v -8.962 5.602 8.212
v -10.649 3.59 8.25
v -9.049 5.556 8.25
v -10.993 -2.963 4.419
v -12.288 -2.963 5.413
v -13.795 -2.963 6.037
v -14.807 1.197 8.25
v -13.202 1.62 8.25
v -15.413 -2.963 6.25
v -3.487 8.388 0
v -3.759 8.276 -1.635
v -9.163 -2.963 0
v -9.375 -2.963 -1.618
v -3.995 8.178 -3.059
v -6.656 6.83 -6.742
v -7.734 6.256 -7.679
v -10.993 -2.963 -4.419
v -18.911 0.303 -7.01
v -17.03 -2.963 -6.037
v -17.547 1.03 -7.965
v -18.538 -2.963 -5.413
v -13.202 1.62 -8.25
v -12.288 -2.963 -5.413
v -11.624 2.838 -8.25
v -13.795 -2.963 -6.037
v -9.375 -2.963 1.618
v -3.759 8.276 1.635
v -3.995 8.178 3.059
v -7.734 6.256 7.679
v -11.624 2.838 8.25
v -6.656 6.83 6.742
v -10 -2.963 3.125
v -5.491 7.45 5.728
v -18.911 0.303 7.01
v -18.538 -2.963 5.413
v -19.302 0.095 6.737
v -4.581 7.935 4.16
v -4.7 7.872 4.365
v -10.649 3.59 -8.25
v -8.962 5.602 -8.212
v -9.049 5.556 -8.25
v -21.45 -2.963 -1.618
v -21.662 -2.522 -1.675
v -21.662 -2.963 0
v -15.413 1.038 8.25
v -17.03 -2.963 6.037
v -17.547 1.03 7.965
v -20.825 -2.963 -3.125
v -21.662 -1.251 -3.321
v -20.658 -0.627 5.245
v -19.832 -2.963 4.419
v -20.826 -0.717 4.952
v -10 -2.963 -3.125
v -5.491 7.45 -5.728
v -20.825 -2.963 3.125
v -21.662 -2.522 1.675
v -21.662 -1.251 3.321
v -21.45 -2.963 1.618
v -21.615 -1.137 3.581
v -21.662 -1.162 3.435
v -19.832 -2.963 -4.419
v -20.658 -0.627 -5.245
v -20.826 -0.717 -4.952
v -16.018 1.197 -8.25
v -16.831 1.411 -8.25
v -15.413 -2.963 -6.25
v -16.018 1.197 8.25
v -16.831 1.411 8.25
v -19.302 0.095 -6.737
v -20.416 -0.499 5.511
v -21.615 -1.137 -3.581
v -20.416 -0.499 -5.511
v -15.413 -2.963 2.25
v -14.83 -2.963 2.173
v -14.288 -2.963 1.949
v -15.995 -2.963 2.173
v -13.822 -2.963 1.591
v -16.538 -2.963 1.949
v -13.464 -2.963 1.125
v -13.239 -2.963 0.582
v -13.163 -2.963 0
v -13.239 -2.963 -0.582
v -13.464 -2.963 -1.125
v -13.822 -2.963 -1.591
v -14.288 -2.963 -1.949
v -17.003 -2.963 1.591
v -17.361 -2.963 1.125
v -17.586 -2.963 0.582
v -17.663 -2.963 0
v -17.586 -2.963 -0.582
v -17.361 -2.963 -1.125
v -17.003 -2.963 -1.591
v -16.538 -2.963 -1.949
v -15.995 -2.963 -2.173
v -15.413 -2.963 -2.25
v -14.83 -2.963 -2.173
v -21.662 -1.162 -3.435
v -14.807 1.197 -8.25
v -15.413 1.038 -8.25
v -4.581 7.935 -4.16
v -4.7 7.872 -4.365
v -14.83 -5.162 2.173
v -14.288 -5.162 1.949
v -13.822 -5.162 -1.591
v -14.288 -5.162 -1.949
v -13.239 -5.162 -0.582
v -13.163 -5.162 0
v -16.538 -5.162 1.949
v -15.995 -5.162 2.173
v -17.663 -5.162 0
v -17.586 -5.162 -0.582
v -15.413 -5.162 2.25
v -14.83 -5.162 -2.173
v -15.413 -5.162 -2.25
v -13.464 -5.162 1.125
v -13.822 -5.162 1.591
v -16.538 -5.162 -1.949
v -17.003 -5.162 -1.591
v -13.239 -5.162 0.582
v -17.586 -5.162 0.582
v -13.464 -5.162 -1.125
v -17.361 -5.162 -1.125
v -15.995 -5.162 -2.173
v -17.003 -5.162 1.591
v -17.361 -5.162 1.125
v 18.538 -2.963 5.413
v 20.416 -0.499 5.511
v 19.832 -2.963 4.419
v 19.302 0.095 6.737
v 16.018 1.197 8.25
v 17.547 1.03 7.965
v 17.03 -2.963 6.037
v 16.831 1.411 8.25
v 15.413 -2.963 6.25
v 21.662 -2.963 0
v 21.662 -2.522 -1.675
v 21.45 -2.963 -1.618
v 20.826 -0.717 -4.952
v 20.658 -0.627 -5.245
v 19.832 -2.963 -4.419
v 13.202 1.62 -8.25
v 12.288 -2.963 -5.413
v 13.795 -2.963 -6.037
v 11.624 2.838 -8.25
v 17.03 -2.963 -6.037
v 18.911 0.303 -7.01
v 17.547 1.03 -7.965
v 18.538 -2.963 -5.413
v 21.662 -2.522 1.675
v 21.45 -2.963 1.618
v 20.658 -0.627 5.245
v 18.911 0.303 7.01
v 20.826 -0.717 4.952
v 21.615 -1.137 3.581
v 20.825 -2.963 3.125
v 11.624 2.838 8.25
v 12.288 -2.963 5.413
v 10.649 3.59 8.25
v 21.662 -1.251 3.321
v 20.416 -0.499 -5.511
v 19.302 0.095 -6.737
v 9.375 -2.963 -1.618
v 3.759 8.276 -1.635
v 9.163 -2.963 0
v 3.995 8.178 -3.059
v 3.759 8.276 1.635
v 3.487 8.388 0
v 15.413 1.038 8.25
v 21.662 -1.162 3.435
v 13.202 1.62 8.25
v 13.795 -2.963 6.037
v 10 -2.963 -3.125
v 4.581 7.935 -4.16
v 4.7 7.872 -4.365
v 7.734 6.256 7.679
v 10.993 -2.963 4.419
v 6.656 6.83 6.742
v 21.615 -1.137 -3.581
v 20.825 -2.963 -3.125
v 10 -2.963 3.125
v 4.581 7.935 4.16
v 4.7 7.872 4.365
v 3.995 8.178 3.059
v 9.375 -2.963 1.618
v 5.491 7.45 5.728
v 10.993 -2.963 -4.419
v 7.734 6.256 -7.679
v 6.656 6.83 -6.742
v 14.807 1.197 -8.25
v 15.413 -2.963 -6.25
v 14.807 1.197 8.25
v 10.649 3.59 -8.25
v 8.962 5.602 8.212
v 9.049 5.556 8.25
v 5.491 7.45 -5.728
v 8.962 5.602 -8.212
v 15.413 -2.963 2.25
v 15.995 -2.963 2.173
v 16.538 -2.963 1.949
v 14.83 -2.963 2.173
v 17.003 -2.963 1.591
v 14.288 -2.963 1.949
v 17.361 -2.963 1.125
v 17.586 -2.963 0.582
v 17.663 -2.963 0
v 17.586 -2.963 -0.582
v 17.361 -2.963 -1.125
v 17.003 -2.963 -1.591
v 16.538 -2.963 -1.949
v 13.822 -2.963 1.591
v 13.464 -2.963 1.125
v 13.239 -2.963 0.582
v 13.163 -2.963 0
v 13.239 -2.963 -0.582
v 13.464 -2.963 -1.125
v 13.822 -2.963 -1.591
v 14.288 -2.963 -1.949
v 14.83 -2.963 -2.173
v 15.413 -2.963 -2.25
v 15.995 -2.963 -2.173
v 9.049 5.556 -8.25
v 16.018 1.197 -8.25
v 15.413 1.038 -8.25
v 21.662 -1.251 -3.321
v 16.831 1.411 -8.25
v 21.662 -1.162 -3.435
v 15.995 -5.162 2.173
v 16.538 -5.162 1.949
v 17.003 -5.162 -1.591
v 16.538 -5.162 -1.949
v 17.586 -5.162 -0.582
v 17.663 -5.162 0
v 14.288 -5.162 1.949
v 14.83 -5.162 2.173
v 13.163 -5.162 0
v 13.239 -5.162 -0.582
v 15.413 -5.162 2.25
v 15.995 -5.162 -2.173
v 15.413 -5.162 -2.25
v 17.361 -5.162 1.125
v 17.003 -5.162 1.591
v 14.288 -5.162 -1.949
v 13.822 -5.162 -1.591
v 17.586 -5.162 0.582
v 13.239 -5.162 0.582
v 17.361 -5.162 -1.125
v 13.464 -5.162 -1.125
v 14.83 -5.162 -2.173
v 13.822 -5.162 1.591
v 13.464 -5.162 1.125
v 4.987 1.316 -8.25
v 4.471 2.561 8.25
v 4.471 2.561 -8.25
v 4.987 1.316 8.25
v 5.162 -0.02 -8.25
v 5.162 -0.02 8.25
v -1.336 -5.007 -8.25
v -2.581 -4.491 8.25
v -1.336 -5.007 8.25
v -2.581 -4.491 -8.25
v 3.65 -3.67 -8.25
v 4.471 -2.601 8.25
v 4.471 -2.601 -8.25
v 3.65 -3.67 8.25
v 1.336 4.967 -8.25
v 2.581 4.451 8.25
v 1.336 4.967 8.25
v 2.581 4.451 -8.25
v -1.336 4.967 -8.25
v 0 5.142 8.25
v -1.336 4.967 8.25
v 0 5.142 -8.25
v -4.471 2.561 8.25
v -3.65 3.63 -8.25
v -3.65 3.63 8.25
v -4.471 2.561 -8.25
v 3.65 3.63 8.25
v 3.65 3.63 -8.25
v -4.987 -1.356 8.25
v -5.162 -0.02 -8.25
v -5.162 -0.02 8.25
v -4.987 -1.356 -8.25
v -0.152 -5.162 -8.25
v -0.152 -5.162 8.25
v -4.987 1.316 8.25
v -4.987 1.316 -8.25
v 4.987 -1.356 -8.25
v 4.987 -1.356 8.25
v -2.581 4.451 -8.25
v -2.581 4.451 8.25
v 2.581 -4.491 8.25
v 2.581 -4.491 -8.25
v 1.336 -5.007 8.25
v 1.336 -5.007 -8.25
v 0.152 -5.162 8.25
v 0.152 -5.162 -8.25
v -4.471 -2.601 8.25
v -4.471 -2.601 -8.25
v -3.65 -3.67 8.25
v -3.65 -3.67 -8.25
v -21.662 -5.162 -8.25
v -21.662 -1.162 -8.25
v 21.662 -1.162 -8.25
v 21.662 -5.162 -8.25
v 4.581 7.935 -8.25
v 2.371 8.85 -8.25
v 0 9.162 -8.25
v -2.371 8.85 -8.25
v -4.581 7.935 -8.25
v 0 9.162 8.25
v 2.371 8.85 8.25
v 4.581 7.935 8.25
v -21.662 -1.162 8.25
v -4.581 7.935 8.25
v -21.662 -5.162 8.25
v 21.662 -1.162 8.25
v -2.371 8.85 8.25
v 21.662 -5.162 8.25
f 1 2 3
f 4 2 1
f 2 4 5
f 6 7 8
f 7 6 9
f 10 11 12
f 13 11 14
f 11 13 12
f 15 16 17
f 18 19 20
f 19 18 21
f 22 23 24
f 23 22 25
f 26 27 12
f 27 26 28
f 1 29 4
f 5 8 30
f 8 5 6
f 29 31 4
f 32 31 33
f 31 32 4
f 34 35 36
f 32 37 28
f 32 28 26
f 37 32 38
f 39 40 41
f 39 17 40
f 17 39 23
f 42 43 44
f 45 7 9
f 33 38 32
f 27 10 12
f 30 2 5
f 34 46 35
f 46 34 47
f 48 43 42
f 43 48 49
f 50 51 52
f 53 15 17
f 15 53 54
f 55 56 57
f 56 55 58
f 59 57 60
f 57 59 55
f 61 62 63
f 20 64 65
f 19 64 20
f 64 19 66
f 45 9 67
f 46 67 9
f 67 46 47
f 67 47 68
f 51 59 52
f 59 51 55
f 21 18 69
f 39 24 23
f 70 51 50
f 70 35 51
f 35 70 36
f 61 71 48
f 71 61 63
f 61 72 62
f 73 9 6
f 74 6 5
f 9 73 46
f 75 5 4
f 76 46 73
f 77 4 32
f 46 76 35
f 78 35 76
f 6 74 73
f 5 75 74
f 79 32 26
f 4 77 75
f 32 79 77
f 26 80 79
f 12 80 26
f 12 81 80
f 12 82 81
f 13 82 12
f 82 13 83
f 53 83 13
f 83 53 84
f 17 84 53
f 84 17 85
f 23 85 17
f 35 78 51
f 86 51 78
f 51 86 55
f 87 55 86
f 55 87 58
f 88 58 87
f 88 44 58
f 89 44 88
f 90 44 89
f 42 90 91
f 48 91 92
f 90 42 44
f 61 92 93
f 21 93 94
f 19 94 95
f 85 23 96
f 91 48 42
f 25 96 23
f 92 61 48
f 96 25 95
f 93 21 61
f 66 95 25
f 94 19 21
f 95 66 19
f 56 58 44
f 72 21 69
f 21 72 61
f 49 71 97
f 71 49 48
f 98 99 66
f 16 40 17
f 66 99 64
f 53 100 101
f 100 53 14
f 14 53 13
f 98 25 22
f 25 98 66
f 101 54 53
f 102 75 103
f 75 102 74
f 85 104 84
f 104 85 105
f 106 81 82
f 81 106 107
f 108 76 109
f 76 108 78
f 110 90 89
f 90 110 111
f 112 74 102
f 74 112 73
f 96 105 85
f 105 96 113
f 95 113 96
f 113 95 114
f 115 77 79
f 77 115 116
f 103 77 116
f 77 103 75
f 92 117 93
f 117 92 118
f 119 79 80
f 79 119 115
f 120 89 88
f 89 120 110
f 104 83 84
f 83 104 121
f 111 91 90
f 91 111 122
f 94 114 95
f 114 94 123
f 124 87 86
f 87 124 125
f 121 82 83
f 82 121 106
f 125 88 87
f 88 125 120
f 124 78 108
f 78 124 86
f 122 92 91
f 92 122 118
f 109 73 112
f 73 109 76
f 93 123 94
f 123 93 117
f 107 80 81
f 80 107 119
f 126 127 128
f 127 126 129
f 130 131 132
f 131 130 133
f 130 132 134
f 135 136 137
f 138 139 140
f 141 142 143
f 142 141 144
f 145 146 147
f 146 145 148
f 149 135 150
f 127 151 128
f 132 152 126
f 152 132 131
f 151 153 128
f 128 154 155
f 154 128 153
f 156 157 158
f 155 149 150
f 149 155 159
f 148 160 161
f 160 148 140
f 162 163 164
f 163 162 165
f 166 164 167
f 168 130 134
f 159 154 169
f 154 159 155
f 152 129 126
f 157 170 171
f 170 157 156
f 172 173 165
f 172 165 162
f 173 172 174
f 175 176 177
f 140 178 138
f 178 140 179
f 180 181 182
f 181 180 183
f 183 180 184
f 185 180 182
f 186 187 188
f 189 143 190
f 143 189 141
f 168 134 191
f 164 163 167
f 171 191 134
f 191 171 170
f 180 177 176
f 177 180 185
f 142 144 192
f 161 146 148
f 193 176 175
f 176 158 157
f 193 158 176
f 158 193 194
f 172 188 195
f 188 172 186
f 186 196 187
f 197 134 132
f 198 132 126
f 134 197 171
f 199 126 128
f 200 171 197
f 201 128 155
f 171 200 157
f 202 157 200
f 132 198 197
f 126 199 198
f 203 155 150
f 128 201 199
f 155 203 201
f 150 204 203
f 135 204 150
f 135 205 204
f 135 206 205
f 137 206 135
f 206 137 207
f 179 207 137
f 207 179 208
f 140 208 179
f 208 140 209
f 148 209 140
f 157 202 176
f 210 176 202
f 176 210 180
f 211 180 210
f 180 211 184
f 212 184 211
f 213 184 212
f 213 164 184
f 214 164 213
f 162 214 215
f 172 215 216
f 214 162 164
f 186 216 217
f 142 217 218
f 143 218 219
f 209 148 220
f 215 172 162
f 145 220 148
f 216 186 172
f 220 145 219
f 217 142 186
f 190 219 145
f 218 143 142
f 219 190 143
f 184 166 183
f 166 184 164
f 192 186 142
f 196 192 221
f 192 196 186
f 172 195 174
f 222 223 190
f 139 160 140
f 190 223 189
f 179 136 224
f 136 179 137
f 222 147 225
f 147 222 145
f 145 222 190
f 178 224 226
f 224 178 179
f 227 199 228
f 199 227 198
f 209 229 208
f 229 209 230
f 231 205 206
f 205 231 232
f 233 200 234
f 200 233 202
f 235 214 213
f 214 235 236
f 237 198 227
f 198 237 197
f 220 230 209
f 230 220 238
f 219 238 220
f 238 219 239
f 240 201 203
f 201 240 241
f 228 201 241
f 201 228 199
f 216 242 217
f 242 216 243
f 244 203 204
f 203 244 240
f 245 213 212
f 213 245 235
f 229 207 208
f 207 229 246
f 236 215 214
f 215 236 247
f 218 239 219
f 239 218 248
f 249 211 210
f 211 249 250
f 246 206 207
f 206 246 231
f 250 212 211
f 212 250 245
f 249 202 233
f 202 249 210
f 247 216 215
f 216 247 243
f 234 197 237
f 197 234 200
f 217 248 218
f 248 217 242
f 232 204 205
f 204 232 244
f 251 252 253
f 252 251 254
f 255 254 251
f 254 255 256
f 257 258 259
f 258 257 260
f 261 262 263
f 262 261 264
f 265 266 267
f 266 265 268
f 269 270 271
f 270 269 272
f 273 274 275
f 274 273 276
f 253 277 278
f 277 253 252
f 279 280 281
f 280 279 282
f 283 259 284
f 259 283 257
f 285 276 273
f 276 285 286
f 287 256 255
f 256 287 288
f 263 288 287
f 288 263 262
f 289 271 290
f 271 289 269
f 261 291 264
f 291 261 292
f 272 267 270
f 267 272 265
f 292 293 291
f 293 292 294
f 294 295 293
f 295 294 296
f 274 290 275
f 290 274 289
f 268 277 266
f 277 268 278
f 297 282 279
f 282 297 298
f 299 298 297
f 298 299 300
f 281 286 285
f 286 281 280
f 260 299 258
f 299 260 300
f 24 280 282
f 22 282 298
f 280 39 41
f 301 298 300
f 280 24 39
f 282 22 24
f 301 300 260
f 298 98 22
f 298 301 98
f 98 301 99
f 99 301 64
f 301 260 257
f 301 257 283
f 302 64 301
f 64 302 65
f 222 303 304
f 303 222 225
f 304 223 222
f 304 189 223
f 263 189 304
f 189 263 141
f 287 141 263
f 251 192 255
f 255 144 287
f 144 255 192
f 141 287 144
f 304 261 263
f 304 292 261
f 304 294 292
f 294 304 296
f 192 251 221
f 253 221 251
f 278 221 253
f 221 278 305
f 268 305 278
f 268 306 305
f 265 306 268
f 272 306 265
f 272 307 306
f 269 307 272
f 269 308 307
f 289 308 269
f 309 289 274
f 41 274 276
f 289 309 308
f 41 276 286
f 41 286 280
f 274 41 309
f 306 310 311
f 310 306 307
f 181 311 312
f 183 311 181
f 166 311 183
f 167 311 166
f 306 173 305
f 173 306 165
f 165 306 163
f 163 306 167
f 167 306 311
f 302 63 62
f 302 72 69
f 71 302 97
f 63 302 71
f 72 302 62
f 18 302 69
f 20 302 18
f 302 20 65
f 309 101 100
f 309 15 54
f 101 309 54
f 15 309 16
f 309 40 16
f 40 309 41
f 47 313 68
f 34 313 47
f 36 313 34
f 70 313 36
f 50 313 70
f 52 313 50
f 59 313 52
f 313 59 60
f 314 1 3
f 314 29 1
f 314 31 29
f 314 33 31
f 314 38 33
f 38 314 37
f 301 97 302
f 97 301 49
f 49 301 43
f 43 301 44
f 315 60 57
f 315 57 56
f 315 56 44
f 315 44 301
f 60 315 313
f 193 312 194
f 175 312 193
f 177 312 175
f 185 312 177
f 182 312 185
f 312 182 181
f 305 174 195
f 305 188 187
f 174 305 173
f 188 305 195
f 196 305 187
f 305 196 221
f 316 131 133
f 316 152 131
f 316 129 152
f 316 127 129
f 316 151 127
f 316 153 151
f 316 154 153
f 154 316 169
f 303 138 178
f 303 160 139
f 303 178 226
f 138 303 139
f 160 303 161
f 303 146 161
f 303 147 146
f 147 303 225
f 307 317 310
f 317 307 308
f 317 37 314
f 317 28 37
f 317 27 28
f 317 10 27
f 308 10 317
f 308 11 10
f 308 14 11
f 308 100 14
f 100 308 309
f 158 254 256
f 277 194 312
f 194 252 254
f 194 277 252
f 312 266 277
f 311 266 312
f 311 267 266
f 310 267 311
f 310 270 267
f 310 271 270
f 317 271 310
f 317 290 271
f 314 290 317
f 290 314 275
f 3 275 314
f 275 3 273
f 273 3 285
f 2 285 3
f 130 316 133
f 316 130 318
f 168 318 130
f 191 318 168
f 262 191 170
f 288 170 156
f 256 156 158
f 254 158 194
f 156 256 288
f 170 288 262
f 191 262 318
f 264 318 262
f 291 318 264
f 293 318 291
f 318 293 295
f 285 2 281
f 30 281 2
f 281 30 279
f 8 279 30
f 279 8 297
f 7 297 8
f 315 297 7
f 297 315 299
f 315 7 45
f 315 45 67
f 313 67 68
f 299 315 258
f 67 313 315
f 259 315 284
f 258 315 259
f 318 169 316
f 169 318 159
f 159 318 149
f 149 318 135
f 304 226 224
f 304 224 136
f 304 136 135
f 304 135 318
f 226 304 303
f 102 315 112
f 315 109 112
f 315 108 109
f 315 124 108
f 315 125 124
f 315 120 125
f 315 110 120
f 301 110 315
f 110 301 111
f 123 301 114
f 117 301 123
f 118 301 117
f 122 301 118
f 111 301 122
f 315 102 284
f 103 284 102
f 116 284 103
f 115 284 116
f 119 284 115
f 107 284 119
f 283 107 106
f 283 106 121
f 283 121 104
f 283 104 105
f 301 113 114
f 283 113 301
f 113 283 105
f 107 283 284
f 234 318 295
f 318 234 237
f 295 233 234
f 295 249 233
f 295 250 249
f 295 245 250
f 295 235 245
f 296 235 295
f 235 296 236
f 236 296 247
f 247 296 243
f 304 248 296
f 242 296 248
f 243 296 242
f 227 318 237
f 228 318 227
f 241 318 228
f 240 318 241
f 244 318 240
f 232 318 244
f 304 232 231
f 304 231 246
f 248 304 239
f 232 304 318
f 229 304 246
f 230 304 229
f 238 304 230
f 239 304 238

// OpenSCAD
// file: layla_config.scad
// Main parameters used for most Layla parts
$fa=15;
$fs=0.1;

// This number avoids roundoff problems
epsilon=0.02;

// This is how much your printer squishes extra around holes
//   bigger value leaves more space for globs.
clearance=0.4;

// Removeable parts leave this much extra diameter
wiggle=0.2;

// Wall thickness for most parts--two nozzle diameters typ.
wall=0.8;

// Floor thickness--at least 4 layers
floor=1.2;


// This is the main drive axle
axle_dia=0.375*25.4+2*clearance;

// Main frame tubing
tube_OD=23.5+2*clearance+wiggle;


// Main woodscrews: Everbilt #8x9/16" lath screws
woodscrew_head_dia=12.5;
woodscrew_shaft_OD=4.5;
woodscrew_shaft_ID=3.0;
woodscrew_shaft_len=20.0;
woodscrew_boss=1.0; // extra thickness under screw head

// Clearance for woodscrew to pass through (minus)
module woodscrew_head(head_clear_scale=1.0) 
{
	head_clear=0.5*floor+epsilon+head_clear_scale*10;
    translate([0,0,woodscrew_boss]) {
        // Head clearance
        cylinder(d1=woodscrew_head_dia,d2=woodscrew_head_dia+head_clear,h=head_clear);
        
        // Through clearance for shaft of screw
        translate([0,0,+epsilon])
        scale([1,1,-1])
            cylinder(d=woodscrew_shaft_OD,h=woodscrew_shaft_len);
    }
}

// Raised area reinforcing woodscrew (plus)
module woodscrew_boss()
{
    boss_ht=1.5*floor+woodscrew_boss;
    translate([0,0,-floor])
        cylinder(d1=woodscrew_head_dia*1.8,d2=woodscrew_head_dia*1.3,h=boss_ht);
}

/*
difference() {
    woodscrew_boss();
    woodscrew_head();
}
*/
// main file
include <layla_config.scad>;

// Distance outside axle for reinforcing
thickwall=4.0;

thick=woodscrew_head_dia+thickwall; // Z thickness of bracket
wide=axle_dia+2*thickwall+2*woodscrew_head_dia; // X length of bracket
high=axle_dia+thickwall; // Y height of bracket

// Put in axle mounting screw hole locations
module axle_holes() {
    translate([0,-axle_dia/2+floor,0])
    rotate([-90,0,0])
    for (side=[-1,+1])
        translate([side*(wide/2-woodscrew_head_dia/2),0,0])
            children();
}

// Build bracket to hold axle to wood frame
module axle_bracket()
{
    intersection() {
difference() {
    union() { // plus
        hull() {
            translate([-wide/2,-axle_dia/2,-thick/2])
                cube([wide,thickwall,thick]);
            cylinder(d=axle_dia+2*thickwall,h=thick,center=true);
        }
        // axle_holes() woodscrew_boss();
    }
    union() { // minus
        // space for axle
        translate([0,-epsilon,0])
        cylinder(d=axle_dia,h=2*thick,center=true);
        
        // space for axle mounting holes
        axle_holes() woodscrew_head(10.0);
    }
}
    // Trim all parts to lie inside bounding box:
    translate([-wide/2,-axle_dia/2,-thick/2])
        cube([wide,high,thick]);
    
    }
}

axle_bracket();
